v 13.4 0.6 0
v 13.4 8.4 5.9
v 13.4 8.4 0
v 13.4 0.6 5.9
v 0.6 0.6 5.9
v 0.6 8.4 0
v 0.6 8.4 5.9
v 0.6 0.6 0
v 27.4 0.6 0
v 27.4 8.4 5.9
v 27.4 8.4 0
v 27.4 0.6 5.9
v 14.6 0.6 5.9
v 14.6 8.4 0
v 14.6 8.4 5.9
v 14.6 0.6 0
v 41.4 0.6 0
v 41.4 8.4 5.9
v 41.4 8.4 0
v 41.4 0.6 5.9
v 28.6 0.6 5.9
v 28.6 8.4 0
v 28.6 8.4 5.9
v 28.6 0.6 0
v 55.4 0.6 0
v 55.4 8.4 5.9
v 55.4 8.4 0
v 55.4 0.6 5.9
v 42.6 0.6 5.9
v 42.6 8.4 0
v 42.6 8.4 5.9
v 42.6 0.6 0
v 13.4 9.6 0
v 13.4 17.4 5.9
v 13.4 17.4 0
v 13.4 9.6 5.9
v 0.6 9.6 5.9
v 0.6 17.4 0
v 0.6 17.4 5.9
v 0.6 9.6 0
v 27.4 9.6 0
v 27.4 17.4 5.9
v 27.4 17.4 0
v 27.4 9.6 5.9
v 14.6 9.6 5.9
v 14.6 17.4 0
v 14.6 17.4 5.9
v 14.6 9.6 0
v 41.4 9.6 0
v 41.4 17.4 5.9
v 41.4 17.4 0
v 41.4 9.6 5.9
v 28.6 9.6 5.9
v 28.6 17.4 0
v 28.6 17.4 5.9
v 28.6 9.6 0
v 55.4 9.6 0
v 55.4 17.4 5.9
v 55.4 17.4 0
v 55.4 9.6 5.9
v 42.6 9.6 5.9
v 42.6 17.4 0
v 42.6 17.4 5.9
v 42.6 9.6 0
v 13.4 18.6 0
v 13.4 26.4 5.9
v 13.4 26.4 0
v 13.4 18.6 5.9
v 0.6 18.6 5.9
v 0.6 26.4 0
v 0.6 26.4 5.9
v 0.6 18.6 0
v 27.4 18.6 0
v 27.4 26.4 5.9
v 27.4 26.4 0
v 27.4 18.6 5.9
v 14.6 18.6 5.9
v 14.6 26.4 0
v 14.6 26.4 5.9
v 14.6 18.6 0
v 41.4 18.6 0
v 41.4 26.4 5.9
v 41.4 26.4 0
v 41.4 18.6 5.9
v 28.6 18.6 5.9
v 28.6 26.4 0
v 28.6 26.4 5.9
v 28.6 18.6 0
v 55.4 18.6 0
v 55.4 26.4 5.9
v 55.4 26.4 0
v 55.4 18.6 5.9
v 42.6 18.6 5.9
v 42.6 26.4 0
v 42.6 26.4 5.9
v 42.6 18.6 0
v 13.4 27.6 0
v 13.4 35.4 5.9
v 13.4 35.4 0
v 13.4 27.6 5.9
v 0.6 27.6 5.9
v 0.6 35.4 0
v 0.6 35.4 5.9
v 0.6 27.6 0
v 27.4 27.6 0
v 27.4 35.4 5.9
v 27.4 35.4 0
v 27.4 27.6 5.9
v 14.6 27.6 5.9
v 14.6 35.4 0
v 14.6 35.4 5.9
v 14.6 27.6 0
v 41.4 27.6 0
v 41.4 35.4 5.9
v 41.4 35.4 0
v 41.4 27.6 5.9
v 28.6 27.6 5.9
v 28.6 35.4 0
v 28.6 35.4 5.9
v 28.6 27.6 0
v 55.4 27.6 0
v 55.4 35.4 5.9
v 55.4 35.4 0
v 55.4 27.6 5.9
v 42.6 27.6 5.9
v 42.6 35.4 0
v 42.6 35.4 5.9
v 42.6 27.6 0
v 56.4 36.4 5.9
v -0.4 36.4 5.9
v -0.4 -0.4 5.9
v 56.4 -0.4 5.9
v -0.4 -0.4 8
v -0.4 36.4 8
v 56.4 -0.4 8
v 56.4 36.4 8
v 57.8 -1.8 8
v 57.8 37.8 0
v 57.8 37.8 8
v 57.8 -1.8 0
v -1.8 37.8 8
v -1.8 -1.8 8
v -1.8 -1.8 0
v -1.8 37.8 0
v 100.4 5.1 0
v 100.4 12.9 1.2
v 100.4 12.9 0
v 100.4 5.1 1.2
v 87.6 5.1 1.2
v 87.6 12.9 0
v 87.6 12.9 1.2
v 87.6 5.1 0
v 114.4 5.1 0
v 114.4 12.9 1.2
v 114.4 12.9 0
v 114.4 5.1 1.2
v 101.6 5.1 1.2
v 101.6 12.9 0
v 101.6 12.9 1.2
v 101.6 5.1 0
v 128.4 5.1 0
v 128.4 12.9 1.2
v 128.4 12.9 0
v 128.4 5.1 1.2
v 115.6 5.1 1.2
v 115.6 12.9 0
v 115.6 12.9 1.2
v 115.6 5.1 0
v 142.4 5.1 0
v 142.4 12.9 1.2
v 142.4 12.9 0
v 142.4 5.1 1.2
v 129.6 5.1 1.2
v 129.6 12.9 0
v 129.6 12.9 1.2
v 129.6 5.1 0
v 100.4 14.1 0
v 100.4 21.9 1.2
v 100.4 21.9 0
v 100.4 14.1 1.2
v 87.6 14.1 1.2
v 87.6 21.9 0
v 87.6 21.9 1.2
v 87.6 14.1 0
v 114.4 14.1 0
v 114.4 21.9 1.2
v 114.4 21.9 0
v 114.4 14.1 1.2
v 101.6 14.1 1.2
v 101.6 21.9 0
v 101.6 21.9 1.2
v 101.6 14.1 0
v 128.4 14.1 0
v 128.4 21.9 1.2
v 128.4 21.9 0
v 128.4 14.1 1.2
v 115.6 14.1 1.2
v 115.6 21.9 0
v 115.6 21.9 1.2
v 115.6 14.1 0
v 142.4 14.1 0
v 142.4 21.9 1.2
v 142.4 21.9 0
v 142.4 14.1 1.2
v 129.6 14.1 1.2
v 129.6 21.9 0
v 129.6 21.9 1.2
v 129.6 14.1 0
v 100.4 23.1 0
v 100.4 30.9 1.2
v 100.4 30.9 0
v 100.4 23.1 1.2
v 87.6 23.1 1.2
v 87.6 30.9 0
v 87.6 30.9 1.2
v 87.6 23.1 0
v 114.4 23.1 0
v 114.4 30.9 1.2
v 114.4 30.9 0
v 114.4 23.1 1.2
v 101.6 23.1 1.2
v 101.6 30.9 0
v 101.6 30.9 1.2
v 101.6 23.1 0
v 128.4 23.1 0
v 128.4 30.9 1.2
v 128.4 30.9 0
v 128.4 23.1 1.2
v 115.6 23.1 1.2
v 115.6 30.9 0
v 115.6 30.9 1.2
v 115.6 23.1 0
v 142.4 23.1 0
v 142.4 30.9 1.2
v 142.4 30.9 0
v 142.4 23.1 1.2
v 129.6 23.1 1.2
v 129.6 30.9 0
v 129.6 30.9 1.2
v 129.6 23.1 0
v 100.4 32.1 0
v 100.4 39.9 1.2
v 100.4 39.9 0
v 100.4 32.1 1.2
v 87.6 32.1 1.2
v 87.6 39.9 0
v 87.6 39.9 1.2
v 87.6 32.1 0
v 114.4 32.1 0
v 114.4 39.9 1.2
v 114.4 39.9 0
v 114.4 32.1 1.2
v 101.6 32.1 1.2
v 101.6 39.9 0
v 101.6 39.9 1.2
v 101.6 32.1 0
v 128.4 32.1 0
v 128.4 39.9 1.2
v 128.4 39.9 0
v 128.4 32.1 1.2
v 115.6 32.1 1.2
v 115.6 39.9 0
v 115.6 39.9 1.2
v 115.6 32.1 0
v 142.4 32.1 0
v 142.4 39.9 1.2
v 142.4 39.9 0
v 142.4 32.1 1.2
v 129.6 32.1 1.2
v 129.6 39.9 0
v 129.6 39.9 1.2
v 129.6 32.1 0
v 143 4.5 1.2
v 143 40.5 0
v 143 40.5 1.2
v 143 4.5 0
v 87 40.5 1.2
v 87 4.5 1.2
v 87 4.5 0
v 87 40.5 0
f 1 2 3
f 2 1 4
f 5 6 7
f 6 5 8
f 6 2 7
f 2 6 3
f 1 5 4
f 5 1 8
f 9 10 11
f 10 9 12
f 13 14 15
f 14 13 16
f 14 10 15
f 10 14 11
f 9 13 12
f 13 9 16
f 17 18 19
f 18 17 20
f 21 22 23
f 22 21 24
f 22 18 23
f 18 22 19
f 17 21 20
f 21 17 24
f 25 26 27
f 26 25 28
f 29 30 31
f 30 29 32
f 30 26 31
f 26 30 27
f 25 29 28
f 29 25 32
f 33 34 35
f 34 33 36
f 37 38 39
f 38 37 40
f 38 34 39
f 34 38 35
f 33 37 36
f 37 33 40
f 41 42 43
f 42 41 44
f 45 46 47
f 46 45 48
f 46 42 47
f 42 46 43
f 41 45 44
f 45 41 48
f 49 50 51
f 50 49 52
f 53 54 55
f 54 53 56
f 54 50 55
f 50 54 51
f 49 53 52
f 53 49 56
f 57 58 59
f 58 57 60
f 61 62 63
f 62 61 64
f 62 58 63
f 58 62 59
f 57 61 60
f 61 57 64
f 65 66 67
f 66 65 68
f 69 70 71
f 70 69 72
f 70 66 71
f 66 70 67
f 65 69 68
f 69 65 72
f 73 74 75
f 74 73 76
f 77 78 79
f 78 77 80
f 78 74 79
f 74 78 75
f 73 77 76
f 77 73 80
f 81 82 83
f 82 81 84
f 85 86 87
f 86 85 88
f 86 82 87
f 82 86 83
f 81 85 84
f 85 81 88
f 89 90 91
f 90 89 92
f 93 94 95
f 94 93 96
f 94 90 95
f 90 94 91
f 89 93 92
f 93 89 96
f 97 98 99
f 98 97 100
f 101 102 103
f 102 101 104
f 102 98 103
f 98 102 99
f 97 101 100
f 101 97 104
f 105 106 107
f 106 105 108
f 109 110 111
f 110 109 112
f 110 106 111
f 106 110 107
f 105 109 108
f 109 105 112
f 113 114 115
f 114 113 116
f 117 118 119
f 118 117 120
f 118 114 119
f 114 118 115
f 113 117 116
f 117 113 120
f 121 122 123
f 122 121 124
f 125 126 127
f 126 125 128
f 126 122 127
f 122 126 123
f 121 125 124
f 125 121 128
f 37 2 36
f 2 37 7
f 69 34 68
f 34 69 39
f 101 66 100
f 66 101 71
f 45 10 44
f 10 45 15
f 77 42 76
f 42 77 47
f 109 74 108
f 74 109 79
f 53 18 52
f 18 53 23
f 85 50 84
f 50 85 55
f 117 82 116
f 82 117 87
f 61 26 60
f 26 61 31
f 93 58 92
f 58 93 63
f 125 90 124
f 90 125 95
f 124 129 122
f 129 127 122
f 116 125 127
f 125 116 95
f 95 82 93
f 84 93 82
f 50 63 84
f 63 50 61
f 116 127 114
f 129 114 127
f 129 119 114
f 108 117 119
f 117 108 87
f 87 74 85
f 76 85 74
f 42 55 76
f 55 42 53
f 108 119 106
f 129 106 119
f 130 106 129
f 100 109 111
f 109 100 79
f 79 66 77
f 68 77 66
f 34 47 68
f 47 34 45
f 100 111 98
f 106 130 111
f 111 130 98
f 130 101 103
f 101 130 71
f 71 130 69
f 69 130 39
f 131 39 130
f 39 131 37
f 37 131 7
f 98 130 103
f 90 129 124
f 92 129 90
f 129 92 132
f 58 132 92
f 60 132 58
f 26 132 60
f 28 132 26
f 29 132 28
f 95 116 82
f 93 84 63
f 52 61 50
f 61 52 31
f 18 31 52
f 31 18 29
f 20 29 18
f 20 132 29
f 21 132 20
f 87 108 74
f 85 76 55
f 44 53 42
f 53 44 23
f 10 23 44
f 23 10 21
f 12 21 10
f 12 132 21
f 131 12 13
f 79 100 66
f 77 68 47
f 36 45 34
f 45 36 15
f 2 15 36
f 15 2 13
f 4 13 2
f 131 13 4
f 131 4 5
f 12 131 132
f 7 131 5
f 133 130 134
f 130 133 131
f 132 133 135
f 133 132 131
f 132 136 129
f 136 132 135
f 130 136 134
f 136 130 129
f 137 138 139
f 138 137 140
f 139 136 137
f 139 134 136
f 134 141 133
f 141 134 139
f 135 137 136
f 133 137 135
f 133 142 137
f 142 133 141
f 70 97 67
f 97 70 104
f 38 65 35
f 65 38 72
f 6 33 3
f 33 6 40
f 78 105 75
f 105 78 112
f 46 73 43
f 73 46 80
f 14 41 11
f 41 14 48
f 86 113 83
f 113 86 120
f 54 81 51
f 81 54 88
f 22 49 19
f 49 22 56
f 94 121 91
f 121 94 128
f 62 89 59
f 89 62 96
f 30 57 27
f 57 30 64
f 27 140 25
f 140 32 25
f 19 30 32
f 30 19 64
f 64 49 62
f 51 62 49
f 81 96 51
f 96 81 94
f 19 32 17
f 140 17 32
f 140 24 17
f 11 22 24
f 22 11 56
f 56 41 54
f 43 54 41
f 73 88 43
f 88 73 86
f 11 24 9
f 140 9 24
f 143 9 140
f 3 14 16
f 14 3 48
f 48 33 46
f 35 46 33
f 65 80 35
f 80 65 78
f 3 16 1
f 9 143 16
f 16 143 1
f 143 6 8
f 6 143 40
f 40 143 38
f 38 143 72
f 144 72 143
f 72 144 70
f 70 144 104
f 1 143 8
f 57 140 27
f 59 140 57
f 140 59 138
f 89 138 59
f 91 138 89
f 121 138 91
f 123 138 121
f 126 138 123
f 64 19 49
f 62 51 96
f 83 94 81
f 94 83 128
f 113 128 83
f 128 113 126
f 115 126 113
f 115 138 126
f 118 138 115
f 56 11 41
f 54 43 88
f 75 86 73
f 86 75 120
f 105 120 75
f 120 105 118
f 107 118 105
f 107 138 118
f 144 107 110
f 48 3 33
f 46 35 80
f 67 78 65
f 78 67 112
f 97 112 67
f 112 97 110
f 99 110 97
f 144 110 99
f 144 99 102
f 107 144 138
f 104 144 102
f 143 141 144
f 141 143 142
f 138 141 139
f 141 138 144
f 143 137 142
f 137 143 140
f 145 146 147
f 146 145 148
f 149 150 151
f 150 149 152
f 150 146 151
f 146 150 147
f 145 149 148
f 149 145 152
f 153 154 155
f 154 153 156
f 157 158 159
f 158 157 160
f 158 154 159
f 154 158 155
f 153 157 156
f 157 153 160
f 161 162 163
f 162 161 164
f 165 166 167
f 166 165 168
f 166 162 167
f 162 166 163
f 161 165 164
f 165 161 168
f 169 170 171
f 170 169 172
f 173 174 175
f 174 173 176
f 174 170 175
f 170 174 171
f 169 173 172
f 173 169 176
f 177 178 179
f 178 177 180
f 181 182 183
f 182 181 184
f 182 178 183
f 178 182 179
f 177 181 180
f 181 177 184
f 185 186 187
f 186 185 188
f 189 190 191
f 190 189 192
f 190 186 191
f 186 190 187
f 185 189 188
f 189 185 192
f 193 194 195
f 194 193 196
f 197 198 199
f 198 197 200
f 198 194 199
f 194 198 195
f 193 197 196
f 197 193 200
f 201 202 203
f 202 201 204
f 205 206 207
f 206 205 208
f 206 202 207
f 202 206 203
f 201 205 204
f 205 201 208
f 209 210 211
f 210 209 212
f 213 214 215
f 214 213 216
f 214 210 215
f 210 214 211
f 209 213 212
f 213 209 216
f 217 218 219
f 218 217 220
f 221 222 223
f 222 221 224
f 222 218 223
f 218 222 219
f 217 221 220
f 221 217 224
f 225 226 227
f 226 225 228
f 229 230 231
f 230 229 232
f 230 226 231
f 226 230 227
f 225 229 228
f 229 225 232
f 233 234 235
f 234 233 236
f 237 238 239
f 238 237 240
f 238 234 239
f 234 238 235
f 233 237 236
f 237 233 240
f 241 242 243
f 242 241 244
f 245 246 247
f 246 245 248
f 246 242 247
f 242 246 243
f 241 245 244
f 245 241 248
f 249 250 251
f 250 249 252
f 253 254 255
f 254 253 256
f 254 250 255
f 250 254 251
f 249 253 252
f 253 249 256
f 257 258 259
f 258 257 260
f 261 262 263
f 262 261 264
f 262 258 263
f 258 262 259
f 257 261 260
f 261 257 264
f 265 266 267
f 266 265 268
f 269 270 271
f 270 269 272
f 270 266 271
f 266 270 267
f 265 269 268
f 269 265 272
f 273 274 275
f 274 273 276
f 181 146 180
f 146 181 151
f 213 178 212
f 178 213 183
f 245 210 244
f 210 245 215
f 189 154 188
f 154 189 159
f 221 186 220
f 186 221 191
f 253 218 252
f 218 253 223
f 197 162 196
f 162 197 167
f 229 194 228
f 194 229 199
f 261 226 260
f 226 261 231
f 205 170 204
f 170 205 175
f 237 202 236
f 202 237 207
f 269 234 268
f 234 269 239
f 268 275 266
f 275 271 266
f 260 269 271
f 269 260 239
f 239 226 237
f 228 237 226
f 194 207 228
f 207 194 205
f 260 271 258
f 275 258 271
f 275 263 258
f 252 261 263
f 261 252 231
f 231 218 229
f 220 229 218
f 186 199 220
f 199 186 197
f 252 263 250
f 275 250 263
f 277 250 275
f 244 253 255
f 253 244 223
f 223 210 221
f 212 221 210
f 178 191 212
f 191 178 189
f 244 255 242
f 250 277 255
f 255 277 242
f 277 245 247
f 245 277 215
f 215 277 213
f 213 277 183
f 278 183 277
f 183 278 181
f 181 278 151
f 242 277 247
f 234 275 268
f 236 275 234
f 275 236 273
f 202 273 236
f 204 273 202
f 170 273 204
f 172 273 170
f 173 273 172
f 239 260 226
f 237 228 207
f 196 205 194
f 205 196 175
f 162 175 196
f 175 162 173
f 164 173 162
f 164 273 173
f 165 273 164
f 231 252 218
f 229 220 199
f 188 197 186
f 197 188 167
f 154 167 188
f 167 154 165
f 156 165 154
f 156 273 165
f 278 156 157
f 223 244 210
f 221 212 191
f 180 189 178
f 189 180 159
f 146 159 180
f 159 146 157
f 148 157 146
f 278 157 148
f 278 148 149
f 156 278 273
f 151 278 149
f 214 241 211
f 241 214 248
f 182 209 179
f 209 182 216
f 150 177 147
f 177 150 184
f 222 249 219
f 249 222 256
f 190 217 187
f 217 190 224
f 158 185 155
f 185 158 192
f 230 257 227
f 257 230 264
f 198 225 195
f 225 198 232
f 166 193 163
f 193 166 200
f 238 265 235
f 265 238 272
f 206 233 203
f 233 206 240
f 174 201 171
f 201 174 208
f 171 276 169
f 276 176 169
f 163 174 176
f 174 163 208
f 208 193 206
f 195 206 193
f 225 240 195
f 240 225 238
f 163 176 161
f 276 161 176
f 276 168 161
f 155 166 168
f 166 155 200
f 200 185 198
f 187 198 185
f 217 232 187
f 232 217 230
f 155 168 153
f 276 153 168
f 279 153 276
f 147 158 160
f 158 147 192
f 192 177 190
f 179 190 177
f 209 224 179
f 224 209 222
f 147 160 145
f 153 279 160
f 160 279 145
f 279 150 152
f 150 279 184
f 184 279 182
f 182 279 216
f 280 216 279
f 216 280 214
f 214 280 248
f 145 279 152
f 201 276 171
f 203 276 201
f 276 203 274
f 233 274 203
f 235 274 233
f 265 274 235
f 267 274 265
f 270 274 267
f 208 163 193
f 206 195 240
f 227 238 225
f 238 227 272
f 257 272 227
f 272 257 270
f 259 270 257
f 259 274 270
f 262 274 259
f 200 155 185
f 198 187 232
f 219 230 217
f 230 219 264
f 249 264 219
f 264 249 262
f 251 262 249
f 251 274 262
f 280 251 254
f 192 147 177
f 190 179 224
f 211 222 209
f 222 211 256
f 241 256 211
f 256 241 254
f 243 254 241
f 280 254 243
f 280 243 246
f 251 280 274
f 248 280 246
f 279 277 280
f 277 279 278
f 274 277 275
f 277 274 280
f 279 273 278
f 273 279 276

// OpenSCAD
// BlinkeShit Frame-Generator Version 3000


WallThickness = 1.2;
OuterWall = 1.8;
StepThickness = WallThickness + 0.8;
Height = 8;
StepHeight = 1.6;

CoverHeight = 1.2;

//LengthX = 80;
//WidthY = 60; 

SizeX = 14;
SizeY = 9;

GridNrX  = 4;
GridNrY = 4;


LengthX = GridNrX*SizeX+OuterWall*2;
WidthY = GridNrY*SizeY+OuterWall*2;

translate([0,0,Height/2])
difference() {
  translate([LengthX/2-OuterWall,WidthY/2-OuterWall,0]) cube(size = [LengthX,WidthY,Height], center = true);
   
  for ( j = [1 : 1 : GridNrY] ){  
    for ( i = [1 : 1 : GridNrX] ){
    translate([i*SizeX-SizeX/2,j*SizeY-SizeY/2,0]) cube(size = [SizeX-WallThickness,SizeY-WallThickness,Height+1], center = true);
    
    }
  }  
  
  
  
  for ( j = [1 : 1 : GridNrY] ){  
    for ( i = [1 : 1 : GridNrX] ){
    translate([i*SizeX-SizeX/2,j*SizeY-SizeY/2,Height-StepHeight]) cube(size = [SizeX-WallThickness+StepThickness,SizeY-WallThickness+StepThickness,Height+1], center = true);
    
    }
  }  
}



//translate([0,0,CoverHeight/2+Height-CoverHeight])
translate([80,0,CoverHeight/2])
difference() {
  translate([35,22.5,0]) cube(size = [LengthX-OuterWall*2,WidthY-OuterWall*2,CoverHeight], center = true);
    
  for ( j = [1 : 1 : 4] ){  
    for ( i = [1 : 1 : 4] ){
    translate([i*14,j*9,0]) cube(size = [14-WallThickness,9-WallThickness,CoverHeight+1], center = true);
    
    }
  }  
  
}
